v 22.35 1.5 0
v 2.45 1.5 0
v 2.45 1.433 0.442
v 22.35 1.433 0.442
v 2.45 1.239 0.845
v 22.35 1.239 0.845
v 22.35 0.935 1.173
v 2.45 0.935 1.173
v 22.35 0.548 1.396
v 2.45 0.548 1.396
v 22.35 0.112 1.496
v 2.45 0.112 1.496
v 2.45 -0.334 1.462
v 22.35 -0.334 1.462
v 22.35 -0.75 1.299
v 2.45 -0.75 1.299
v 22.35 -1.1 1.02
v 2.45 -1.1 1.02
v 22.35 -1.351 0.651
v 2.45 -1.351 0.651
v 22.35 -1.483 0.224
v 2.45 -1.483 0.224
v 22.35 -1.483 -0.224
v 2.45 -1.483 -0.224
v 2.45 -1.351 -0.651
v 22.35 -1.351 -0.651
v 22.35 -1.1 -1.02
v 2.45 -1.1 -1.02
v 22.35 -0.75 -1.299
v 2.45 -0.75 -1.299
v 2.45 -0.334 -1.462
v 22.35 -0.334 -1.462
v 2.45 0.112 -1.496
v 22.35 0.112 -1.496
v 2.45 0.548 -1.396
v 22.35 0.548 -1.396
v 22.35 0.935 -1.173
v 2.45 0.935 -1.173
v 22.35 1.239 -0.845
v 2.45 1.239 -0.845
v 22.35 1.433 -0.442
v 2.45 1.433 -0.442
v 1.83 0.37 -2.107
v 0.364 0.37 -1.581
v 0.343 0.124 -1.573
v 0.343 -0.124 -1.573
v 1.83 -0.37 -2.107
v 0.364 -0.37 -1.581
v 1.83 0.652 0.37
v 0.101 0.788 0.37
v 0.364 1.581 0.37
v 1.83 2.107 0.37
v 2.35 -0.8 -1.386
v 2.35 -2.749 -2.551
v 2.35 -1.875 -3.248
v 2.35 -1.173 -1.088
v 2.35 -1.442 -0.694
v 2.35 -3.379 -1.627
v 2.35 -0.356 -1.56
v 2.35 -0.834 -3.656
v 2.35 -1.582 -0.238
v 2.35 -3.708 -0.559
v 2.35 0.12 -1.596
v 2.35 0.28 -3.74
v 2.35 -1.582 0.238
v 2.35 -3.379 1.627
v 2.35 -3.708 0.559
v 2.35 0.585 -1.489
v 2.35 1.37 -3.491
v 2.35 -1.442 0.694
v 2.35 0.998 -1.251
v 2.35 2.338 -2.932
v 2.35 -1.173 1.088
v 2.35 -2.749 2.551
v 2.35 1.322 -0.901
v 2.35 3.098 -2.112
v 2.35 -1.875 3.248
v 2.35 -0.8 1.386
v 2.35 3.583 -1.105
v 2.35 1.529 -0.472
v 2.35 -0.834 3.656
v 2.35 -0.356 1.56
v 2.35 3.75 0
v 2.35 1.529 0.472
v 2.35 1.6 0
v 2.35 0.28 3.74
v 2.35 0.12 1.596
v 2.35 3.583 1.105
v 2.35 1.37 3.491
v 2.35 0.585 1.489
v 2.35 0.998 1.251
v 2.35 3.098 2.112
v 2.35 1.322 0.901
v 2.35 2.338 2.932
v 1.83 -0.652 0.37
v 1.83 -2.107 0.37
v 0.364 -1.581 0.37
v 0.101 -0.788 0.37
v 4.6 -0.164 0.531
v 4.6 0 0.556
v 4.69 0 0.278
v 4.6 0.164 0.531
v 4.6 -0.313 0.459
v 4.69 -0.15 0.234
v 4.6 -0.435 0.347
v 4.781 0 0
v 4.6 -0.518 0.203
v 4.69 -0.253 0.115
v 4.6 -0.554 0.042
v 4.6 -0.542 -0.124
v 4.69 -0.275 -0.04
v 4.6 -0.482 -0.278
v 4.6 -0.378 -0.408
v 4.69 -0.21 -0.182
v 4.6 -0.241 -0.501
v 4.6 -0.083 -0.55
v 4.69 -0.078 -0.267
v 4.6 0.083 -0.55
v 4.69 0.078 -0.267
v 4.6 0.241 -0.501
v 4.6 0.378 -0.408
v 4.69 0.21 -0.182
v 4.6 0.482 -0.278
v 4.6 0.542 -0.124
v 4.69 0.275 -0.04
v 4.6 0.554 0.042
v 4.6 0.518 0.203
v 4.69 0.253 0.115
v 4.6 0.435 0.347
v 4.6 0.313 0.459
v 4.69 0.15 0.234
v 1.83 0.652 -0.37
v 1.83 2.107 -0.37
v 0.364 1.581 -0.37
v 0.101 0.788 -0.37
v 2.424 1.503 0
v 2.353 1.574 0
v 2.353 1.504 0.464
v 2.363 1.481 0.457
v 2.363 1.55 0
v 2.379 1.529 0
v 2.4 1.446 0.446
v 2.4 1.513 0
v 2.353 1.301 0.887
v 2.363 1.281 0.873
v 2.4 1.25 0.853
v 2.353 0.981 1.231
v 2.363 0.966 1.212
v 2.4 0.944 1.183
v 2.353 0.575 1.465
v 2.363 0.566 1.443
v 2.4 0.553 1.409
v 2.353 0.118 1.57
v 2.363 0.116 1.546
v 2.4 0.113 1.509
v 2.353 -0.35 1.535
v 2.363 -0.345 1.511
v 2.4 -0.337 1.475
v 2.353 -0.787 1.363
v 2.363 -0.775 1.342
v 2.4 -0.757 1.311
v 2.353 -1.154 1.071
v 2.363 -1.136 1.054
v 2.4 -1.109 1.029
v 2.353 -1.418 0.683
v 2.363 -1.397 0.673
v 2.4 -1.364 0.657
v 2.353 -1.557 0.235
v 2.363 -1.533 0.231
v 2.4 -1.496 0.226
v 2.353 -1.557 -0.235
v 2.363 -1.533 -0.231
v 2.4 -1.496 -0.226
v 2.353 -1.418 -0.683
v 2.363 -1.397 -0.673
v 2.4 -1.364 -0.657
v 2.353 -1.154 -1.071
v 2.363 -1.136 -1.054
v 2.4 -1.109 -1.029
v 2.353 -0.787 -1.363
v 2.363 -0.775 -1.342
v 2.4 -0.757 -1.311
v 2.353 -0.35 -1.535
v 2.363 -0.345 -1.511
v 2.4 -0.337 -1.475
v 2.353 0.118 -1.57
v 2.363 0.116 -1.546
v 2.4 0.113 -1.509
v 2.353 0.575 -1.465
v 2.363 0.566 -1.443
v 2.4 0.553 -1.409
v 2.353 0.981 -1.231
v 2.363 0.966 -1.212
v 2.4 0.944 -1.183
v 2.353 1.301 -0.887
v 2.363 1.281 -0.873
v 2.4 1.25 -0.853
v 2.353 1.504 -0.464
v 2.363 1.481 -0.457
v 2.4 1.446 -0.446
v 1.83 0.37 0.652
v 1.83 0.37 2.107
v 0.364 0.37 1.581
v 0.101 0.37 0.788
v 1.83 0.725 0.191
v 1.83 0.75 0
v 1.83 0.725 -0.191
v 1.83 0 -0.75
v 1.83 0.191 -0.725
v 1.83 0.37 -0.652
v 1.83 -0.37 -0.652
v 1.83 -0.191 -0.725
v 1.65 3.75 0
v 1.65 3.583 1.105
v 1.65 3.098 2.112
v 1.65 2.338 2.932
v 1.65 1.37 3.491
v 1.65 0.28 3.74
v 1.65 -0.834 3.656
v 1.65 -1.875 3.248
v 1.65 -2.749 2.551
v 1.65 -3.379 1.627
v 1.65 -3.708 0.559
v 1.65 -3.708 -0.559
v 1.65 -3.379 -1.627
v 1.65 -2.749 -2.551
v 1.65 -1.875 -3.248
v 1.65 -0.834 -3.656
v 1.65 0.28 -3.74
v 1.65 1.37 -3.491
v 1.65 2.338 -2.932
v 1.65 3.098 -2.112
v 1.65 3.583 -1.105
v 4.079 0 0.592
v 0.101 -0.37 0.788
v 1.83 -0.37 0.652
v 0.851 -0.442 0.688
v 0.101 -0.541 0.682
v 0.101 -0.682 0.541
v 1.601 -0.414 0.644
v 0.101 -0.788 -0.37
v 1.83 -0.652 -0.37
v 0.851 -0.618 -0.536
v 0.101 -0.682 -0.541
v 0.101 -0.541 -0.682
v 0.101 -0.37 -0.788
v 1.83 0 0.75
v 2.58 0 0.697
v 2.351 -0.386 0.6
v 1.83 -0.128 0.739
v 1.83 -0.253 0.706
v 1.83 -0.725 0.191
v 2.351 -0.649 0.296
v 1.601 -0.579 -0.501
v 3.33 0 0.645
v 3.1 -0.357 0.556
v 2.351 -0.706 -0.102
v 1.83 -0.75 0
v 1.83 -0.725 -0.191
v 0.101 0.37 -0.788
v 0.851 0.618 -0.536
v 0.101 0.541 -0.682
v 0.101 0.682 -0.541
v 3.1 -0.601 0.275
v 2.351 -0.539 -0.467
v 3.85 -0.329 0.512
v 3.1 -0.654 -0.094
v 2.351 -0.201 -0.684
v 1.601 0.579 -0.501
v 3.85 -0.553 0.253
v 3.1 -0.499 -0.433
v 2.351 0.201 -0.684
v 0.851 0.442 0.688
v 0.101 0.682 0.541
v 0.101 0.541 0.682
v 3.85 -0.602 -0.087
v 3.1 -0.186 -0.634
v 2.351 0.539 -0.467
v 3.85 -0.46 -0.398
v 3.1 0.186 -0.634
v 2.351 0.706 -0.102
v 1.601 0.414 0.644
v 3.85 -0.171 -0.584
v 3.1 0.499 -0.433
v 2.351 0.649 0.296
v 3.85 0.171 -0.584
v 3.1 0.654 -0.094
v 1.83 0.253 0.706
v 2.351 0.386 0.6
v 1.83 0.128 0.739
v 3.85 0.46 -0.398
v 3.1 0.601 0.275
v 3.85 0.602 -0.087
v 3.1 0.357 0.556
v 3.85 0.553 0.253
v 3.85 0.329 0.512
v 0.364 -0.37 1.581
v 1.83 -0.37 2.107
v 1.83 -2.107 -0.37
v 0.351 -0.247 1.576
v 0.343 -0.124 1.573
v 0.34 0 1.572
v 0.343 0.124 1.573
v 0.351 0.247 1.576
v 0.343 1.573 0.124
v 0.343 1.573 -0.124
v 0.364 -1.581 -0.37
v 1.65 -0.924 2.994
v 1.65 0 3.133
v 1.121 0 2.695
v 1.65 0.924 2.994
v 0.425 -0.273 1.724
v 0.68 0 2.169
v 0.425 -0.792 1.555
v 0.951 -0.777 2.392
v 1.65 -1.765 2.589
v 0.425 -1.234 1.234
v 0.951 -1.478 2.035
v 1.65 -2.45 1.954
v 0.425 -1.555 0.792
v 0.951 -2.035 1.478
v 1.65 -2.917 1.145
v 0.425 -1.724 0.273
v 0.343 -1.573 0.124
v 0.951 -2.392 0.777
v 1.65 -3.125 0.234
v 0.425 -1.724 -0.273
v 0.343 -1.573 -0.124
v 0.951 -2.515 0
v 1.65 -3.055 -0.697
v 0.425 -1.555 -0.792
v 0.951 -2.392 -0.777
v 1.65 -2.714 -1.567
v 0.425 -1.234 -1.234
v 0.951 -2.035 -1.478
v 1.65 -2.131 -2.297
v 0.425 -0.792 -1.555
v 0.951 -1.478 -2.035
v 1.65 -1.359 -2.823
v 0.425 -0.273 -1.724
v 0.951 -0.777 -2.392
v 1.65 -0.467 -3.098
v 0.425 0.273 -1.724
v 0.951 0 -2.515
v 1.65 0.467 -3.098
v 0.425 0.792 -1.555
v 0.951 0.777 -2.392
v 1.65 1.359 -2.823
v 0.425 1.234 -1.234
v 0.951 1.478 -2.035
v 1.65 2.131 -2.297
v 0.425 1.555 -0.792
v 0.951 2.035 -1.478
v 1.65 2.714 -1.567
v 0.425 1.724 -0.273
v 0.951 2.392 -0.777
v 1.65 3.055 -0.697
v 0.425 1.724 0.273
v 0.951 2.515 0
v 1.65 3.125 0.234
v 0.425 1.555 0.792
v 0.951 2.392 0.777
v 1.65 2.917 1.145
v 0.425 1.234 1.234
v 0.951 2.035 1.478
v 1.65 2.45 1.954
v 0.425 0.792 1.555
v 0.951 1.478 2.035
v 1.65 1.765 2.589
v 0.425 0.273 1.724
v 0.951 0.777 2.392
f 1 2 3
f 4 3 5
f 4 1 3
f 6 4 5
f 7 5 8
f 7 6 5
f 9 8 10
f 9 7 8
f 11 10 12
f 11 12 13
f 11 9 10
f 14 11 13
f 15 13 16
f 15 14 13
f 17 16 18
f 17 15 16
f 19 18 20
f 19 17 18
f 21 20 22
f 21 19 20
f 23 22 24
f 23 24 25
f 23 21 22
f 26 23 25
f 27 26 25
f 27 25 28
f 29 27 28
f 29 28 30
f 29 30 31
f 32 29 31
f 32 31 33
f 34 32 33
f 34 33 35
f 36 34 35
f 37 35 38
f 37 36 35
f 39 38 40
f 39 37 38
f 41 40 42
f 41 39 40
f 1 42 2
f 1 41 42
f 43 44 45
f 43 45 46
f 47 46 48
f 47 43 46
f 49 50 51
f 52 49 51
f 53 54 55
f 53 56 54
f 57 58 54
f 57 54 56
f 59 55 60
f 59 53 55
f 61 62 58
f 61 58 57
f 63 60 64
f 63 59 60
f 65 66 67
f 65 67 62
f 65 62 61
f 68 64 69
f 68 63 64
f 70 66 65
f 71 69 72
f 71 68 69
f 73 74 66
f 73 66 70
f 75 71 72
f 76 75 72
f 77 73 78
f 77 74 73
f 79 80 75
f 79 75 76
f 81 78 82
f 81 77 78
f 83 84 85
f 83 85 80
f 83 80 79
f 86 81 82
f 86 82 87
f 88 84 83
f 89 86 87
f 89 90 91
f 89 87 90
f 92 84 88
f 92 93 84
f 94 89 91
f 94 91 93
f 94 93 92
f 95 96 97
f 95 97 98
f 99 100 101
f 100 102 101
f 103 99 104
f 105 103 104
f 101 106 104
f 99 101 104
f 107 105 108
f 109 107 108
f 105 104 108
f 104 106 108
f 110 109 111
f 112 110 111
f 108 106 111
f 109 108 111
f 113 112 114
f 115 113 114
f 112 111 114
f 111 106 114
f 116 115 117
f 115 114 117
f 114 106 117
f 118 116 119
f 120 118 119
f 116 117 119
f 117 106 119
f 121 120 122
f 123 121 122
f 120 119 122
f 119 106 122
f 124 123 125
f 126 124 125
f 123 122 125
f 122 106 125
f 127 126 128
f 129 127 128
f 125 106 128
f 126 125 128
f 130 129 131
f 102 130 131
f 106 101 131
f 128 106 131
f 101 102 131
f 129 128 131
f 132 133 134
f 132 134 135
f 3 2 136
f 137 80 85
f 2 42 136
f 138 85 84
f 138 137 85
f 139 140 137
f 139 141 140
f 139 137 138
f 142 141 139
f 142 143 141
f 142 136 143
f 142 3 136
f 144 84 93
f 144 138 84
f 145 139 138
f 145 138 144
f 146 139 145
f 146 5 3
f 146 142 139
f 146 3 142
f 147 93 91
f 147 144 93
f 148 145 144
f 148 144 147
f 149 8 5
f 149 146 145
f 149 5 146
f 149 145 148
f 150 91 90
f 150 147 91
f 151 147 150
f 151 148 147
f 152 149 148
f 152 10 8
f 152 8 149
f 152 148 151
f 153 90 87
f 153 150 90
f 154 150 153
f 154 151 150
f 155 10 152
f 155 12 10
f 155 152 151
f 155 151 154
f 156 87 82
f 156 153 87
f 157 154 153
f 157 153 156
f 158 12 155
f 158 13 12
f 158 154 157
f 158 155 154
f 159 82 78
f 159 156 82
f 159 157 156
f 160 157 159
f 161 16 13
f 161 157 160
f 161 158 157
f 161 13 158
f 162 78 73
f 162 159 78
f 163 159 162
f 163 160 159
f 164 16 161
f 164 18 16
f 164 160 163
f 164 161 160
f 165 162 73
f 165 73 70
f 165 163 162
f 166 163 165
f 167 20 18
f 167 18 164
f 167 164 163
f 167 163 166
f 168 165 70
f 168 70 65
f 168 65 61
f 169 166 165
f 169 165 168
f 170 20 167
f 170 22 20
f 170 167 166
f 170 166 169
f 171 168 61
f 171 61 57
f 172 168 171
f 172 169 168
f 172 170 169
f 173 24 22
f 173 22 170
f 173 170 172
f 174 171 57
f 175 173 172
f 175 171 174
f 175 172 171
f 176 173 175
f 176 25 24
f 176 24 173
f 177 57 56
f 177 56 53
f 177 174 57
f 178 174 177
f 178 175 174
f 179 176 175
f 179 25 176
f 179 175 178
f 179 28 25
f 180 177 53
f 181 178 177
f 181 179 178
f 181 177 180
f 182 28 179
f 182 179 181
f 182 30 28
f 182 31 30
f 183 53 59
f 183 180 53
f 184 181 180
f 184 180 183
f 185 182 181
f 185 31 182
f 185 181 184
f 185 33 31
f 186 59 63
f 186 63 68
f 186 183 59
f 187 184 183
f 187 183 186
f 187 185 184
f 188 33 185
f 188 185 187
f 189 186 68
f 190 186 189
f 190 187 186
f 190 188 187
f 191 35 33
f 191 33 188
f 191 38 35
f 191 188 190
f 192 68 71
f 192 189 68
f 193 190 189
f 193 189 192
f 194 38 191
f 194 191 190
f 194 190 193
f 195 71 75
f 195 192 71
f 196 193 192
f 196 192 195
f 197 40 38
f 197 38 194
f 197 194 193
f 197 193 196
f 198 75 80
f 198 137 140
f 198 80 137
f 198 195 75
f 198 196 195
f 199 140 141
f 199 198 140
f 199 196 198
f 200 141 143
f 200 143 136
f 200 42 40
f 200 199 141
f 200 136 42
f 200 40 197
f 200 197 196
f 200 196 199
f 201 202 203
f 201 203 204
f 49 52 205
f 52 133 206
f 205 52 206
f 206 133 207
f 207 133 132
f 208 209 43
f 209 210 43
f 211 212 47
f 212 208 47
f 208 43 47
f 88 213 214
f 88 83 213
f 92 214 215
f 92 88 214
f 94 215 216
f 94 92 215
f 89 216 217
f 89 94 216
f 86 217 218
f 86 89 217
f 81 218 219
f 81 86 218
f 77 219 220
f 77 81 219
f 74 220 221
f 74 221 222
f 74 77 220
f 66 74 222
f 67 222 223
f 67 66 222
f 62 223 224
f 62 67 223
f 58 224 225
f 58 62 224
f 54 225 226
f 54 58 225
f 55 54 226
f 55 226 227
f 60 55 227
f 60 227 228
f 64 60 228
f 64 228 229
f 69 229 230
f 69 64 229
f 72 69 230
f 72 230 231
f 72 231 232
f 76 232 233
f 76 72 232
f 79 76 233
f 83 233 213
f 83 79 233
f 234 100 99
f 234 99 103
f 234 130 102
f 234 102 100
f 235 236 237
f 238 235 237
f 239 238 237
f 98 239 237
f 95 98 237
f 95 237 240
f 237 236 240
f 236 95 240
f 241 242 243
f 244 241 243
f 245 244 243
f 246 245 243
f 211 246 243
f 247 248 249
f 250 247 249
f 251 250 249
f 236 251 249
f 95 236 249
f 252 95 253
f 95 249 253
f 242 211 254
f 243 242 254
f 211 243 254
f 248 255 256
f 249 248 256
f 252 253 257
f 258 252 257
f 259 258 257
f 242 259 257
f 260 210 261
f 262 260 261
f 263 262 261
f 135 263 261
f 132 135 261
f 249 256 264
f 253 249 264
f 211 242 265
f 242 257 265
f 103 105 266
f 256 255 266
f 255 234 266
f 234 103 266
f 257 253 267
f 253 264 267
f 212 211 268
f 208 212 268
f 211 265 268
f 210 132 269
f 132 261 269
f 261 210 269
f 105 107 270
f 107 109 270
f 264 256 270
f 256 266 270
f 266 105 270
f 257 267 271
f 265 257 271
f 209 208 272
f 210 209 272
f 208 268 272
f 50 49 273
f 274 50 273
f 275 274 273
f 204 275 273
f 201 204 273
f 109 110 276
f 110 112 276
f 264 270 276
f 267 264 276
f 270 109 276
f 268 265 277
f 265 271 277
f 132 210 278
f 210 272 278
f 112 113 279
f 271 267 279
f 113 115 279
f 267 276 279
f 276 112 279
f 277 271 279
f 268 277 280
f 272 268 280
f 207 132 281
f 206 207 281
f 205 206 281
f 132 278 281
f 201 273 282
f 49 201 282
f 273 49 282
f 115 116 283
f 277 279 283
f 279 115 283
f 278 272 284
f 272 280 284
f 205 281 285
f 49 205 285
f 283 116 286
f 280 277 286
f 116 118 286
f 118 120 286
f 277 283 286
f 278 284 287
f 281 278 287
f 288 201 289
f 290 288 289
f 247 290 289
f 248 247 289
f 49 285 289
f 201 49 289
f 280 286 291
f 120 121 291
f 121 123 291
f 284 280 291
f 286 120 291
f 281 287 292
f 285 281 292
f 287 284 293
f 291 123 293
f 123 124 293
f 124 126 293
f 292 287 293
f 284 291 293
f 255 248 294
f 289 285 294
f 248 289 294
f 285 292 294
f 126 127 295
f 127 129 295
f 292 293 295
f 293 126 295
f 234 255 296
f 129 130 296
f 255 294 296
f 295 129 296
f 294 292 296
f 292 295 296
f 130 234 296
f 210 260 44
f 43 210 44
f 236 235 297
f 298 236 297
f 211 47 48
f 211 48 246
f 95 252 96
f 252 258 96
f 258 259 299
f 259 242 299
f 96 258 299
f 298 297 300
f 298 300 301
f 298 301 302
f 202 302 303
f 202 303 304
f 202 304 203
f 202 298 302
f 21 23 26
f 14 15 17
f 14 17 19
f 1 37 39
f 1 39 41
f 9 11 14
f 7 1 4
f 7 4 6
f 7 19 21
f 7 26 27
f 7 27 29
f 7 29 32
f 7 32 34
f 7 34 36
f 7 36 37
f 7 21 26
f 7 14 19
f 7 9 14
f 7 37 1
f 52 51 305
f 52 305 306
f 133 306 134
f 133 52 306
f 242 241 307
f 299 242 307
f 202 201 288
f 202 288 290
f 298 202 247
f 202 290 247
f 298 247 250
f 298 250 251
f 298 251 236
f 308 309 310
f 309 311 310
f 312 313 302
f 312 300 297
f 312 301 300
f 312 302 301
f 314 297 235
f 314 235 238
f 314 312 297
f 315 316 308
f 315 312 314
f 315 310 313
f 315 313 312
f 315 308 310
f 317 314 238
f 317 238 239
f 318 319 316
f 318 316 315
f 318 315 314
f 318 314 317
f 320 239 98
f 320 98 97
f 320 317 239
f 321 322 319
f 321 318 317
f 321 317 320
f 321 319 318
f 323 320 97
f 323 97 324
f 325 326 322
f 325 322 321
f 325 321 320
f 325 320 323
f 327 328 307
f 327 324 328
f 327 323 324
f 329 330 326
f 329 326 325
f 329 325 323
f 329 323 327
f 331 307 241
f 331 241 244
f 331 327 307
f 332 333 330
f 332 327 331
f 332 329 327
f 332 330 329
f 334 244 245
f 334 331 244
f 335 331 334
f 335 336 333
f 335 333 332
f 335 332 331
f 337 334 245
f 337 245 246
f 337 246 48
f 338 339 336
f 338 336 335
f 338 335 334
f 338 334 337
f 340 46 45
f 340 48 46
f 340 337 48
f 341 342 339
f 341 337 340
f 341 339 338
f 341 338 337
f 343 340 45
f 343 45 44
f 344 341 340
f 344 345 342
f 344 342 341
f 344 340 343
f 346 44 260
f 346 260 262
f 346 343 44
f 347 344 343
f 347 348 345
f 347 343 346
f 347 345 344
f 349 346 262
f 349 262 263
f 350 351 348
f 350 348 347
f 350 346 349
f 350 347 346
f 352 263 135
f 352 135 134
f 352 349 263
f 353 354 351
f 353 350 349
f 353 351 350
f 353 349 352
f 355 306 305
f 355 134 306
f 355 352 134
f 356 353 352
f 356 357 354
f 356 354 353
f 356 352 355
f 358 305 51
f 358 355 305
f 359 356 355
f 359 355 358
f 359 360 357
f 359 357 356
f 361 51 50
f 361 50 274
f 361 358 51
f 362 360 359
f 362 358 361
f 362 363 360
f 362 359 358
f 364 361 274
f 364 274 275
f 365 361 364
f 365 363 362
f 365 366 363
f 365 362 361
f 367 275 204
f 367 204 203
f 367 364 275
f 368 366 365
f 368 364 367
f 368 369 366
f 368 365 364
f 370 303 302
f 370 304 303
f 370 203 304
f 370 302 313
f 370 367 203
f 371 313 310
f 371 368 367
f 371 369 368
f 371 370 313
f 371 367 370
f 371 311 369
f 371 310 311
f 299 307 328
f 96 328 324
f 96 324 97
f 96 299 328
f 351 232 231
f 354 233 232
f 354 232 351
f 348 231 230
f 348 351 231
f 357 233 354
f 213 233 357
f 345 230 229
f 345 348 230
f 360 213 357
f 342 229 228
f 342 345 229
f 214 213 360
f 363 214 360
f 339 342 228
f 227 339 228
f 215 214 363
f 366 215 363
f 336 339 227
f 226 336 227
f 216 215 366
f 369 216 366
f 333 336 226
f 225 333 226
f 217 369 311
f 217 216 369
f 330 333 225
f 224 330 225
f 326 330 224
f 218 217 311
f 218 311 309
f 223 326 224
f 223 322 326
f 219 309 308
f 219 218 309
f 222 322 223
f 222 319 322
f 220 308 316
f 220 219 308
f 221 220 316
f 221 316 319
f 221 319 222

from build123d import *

# Parameters (mm, degrees)
RECPAT_COUNT = 2
RECPAT_ANGLE = 90


with BuildPart() as part:
    # Fillet1: read off the stored shape, not the designer's step
    # Fillet1 outline → Fillet1 (revolve)
    with BuildSketch(Plane.YX):
        with BuildLine():
            Line((1.5, 2.45), (1.5, 22.35))
            Line((1.5, 22.35), (0, 22.35))
            Line((0, 22.35), (0, 1.65))
            Line((0, 1.65), (3.75, 1.65))
            Line((3.75, 1.65), (3.75, 2.35))
            Line((3.75, 2.35), (1.6, 2.35))
            ThreePointArc((1.6, 2.35), (1.529289322, 2.379289322), (1.5, 2.45))
        make_face()
    revolve(axis=Axis((0, 0, 0), (1, 0, 0)))

    # PanSke → Pan (revolve)
    with BuildSketch(Plane.XY, mode=Mode.PRIVATE) as pan_sk:
        with BuildLine():
            Line((1.65, 3.133289007), (1.65, 0))
            Line((1.65, 0), (0, 0))
            ThreePointArc((0, 0), (0.437709114, 1.770593121), (1.65, 3.133289007))
        make_face()
    revolve(pan_sk.sketch.rotate(Axis((0, 0, 0), (1, 0, 0)), 90), axis=Axis((0, 0, 0), (1, 0, 0)))

    # Sketch3 → Recess section 0
    with BuildSketch(Plane(origin=(0, 0, 0), x_dir=(0, 0, -1), z_dir=(1, 0, 0))):
        with BuildLine():
            Line((-0.37, 1.45), (0.37, 1.45))
            Line((0.37, 1.45), (0.37, -1.45))
            Line((0.37, -1.45), (-0.37, -1.45))
            Line((-0.37, -1.45), (-0.37, 1.45))
        make_face()
    # Sketch4 → Recess section 1
    with BuildSketch(Plane(origin=(1.83, 0, 0), x_dir=(0, 0, -1), z_dir=(1, 0, 0))):
        with BuildLine():
            Line((-0.37, 2.106524682), (0.37, 2.106524682))
            Line((0.37, 2.106524682), (0.37, -2.106524682))
            Line((0.37, -2.106524682), (-0.37, -2.106524682))
            Line((-0.37, -2.106524682), (-0.37, 2.106524682))
        make_face()
    recess = loft(mode=Mode.SUBTRACT)

    # RecPat: Recess ×2 about axis
    recpat_axis = Axis((0, 0, 0), (1, 0, 0))
    for i in range(1, RECPAT_COUNT):
        add(recess.rotate(recpat_axis, i * RECPAT_ANGLE / (RECPAT_COUNT - 1)), mode=Mode.SUBTRACT)

    # RecCorSke → RecessCore (revolve, cut)
    with BuildSketch(Plane.XY, mode=Mode.PRIVATE) as recesscore_sk:
        Polygon((0, 0), (0, 0.877663335), (4.6, 0.556), (4.780655351, 0), align=None)
    revolve(recesscore_sk.sketch.rotate(Axis((-3.175, 0, 0), (1, 0, 0)), 90), axis=Axis((-3.175, 0, 0), (1, 0, 0)), mode=Mode.SUBTRACT)


solid = part.part
